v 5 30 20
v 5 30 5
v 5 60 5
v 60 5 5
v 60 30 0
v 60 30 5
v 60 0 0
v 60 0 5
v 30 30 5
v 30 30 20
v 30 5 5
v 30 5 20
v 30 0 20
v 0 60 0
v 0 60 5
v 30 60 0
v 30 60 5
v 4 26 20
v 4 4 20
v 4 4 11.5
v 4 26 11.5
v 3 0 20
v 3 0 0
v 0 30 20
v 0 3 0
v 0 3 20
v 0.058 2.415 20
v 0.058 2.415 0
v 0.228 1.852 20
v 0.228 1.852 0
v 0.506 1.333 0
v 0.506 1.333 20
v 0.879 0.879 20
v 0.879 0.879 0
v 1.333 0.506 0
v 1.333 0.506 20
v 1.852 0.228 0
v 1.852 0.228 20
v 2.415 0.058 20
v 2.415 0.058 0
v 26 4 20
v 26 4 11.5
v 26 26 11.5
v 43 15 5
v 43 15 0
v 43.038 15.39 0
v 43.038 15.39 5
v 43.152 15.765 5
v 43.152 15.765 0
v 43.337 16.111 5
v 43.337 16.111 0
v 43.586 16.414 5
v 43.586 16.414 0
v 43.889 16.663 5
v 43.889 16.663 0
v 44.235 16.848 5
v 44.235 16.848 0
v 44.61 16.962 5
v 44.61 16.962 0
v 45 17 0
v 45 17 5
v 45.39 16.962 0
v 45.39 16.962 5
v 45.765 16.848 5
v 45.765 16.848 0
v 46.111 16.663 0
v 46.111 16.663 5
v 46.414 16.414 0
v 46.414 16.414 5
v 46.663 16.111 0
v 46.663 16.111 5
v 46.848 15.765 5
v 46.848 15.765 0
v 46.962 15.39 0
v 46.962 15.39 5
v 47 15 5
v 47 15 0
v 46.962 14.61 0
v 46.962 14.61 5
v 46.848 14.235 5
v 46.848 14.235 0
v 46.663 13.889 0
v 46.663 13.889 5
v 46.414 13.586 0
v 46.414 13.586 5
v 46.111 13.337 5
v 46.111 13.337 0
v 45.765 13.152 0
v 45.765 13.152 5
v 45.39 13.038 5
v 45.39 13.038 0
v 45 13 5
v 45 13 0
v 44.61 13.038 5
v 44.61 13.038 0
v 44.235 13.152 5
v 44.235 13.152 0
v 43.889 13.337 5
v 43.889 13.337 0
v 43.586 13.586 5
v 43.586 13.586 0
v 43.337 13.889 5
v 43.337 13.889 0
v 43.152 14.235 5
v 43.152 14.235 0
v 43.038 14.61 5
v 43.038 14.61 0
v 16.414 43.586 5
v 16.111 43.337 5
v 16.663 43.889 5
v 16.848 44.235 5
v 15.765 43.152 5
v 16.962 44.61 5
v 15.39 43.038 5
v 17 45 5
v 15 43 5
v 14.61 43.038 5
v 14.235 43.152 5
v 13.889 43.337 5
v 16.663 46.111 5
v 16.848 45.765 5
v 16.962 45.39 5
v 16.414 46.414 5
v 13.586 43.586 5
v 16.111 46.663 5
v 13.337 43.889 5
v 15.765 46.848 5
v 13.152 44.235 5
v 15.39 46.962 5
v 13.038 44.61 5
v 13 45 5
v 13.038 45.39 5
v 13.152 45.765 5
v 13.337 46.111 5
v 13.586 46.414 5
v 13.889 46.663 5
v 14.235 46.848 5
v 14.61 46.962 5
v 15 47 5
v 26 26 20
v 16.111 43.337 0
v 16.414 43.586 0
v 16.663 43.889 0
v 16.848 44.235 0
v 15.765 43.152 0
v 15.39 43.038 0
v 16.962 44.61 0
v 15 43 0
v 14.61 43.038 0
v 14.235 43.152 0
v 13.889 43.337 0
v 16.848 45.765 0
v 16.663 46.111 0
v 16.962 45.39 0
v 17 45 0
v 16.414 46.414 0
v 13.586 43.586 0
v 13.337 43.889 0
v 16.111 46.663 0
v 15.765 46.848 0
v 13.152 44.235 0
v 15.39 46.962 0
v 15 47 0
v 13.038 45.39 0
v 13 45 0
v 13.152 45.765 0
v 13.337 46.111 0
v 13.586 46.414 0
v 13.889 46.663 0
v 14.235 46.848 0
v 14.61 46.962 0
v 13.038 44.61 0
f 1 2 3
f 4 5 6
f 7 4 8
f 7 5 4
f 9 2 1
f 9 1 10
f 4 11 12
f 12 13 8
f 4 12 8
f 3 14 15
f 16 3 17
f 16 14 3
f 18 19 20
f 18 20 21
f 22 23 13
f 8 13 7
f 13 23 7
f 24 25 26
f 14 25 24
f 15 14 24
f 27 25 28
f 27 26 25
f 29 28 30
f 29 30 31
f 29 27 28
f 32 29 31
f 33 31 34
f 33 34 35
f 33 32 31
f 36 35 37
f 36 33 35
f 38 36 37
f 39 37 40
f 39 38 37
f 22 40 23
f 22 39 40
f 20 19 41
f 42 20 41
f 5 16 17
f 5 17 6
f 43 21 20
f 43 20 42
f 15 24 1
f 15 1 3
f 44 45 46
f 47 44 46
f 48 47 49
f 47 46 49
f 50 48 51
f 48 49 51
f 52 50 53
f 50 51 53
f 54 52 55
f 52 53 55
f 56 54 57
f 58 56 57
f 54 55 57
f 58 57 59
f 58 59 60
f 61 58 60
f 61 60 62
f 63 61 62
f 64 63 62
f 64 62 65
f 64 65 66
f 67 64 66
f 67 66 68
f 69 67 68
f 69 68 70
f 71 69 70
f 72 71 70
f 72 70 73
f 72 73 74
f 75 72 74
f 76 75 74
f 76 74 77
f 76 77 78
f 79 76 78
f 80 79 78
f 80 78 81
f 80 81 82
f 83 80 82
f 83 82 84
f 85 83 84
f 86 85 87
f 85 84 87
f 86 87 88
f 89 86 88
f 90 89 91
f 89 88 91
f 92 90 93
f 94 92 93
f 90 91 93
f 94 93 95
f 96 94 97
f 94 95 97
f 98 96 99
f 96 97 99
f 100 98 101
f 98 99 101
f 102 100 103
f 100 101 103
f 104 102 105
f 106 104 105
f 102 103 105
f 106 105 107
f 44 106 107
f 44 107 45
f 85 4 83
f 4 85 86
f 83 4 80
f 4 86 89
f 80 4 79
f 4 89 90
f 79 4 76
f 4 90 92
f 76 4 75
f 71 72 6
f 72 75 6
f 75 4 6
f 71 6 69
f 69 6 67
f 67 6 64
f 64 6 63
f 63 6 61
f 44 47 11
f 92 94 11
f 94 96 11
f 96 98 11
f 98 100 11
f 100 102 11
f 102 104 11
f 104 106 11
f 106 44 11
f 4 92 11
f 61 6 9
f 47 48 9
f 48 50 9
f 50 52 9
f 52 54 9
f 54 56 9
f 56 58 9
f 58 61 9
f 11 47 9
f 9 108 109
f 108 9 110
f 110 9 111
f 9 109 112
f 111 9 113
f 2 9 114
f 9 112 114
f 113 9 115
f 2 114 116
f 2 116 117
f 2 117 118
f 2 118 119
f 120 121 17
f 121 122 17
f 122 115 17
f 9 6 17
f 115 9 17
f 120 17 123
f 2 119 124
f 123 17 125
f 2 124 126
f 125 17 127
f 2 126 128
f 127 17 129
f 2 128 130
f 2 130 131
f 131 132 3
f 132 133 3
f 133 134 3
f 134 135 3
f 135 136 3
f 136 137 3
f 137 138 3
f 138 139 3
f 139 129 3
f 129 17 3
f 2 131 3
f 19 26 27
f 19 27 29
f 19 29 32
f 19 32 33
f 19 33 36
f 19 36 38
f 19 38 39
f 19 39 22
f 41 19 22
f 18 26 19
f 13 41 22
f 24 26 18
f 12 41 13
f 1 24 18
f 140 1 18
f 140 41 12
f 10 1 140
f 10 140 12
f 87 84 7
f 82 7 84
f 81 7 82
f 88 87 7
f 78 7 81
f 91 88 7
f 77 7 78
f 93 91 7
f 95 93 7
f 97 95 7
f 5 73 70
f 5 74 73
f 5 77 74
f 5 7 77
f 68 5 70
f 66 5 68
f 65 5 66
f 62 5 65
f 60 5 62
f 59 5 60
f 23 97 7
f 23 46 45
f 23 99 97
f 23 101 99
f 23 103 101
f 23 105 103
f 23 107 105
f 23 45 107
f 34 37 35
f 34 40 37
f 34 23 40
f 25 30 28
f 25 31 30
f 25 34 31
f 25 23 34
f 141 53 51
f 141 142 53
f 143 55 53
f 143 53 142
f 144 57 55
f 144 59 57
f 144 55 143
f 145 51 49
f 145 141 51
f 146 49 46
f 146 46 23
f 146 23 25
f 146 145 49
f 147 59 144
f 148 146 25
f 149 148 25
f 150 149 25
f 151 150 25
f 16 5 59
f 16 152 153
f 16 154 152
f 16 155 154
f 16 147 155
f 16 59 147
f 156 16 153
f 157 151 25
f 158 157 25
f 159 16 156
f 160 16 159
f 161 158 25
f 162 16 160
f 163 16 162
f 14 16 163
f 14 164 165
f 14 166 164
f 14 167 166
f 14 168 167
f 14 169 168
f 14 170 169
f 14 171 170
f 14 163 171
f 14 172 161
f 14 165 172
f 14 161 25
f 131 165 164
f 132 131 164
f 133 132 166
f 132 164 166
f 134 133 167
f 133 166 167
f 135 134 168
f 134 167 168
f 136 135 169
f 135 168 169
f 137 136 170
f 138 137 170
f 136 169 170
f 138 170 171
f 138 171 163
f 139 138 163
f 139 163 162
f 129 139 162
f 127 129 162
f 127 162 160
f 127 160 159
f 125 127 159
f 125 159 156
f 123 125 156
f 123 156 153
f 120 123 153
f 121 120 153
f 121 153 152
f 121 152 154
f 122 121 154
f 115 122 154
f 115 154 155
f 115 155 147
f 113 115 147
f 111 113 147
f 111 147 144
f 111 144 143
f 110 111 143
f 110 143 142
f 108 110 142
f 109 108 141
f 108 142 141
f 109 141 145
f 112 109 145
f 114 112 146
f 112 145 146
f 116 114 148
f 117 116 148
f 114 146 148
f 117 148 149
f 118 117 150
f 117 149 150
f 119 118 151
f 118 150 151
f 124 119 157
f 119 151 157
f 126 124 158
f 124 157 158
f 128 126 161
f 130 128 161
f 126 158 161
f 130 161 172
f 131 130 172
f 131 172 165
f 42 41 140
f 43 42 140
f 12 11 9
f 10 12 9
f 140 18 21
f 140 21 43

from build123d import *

# Parameters (mm, degrees)
DODANIE_WYCI_GNI_CIE1_DEPTH = 5
WYTNIJ_WYCI_GNI_CIE1_REACH  = 87
SZKIC2_R                    = 2
SZKIC3_W                    = 30
SZKIC3_H                    = 30
DODANIE_WYCI_GNI_CIE2_DEPTH = 15
DODANIE_WYCI_GNI_CIE3_DEPTH = 5
DODANIE_WYCI_GNI_CIE4_DEPTH = 5
ZAOKR_GLENIE1_R             = 3
SZKIC6_W                    = 22
SZKIC6_H                    = 22
WYTNIJ_WYCI_GNI_CIE2_DEPTH  = 8.5


with BuildPart() as part:
    # Szkic1 → Dodanie-wyciągnięcie1 (new body)
    with BuildSketch(Plane.XY):
        Polygon((0, 0), (0, 60), (30, 60), (60, 30), (60, 0), align=None)
    extrude(amount=DODANIE_WYCI_GNI_CIE1_DEPTH)

    # Szkic2 → Wytnij-wyciągnięcie1 (cut, up to next)
    with BuildSketch(Plane(origin=(0, 0, 0), x_dir=(-1, 0, 0), z_dir=(0, 0, -1)), mode=Mode.PRIVATE) as wytnij_wyci_gni_cie1_sk1:
        with Locations((-45, 15)):
            Circle(SZKIC2_R)
    wytnij_wyci_gni_cie1_tool1 = extrude(wytnij_wyci_gni_cie1_sk1.sketch, amount=-WYTNIJ_WYCI_GNI_CIE1_REACH, mode=Mode.PRIVATE) & part.part
    # Szkic2 → Wytnij-wyciągnięcie1 (cut, up to next)
    with BuildSketch(Plane(origin=(0, 0, 0), x_dir=(-1, 0, 0), z_dir=(0, 0, -1)), mode=Mode.PRIVATE) as wytnij_wyci_gni_cie1_sk2:
        with Locations((-15, 45)):
            Circle(SZKIC2_R)
    wytnij_wyci_gni_cie1_tool2 = extrude(wytnij_wyci_gni_cie1_sk2.sketch, amount=-WYTNIJ_WYCI_GNI_CIE1_REACH, mode=Mode.PRIVATE) & part.part
    add(wytnij_wyci_gni_cie1_tool1.solids().sort_by_distance((45, 15, 0))[0], mode=Mode.SUBTRACT)
    add(wytnij_wyci_gni_cie1_tool2.solids().sort_by_distance((15, 45, 0))[0], mode=Mode.SUBTRACT)

    # Szkic3 → Dodanie-wyciągnięcie2 (add)
    with BuildSketch(Plane.XY.offset(5)):
        with Locations((15, 15)):
            Rectangle(SZKIC3_W, SZKIC3_H)
    extrude(amount=DODANIE_WYCI_GNI_CIE2_DEPTH)

    # Szkic4 → Dodanie-wyciągnięcie3 (add)
    with BuildSketch(Plane(origin=(0, 0, 0), x_dir=(-1, 0, 0), z_dir=(0, -1, 0))):
        Polygon((-30, -5), (-30, -20), (-60, -5), align=None)
    extrude(amount=-DODANIE_WYCI_GNI_CIE3_DEPTH)

    # Szkic5 → Dodanie-wyciągnięcie4 (add)
    with BuildSketch(Plane.ZY):
        Polygon((5, 30), (20, 30), (5, 60), align=None)
    extrude(amount=-DODANIE_WYCI_GNI_CIE4_DEPTH)

    # Zaokrąglenie1
    zaokr_glenie1_edges = [part.edges().sort_by_distance(p)[0] for p in [
        (0, 0, 10),
    ]]
    fillet(zaokr_glenie1_edges, radius=ZAOKR_GLENIE1_R)

    # Szkic6 → Wytnij-wyciągnięcie2 (cut)
    with BuildSketch(Plane.XY.offset(20)):
        with Locations((15, 15)):
            Rectangle(SZKIC6_W, SZKIC6_H)
    extrude(amount=-WYTNIJ_WYCI_GNI_CIE2_DEPTH, mode=Mode.SUBTRACT)


solid = part.part
